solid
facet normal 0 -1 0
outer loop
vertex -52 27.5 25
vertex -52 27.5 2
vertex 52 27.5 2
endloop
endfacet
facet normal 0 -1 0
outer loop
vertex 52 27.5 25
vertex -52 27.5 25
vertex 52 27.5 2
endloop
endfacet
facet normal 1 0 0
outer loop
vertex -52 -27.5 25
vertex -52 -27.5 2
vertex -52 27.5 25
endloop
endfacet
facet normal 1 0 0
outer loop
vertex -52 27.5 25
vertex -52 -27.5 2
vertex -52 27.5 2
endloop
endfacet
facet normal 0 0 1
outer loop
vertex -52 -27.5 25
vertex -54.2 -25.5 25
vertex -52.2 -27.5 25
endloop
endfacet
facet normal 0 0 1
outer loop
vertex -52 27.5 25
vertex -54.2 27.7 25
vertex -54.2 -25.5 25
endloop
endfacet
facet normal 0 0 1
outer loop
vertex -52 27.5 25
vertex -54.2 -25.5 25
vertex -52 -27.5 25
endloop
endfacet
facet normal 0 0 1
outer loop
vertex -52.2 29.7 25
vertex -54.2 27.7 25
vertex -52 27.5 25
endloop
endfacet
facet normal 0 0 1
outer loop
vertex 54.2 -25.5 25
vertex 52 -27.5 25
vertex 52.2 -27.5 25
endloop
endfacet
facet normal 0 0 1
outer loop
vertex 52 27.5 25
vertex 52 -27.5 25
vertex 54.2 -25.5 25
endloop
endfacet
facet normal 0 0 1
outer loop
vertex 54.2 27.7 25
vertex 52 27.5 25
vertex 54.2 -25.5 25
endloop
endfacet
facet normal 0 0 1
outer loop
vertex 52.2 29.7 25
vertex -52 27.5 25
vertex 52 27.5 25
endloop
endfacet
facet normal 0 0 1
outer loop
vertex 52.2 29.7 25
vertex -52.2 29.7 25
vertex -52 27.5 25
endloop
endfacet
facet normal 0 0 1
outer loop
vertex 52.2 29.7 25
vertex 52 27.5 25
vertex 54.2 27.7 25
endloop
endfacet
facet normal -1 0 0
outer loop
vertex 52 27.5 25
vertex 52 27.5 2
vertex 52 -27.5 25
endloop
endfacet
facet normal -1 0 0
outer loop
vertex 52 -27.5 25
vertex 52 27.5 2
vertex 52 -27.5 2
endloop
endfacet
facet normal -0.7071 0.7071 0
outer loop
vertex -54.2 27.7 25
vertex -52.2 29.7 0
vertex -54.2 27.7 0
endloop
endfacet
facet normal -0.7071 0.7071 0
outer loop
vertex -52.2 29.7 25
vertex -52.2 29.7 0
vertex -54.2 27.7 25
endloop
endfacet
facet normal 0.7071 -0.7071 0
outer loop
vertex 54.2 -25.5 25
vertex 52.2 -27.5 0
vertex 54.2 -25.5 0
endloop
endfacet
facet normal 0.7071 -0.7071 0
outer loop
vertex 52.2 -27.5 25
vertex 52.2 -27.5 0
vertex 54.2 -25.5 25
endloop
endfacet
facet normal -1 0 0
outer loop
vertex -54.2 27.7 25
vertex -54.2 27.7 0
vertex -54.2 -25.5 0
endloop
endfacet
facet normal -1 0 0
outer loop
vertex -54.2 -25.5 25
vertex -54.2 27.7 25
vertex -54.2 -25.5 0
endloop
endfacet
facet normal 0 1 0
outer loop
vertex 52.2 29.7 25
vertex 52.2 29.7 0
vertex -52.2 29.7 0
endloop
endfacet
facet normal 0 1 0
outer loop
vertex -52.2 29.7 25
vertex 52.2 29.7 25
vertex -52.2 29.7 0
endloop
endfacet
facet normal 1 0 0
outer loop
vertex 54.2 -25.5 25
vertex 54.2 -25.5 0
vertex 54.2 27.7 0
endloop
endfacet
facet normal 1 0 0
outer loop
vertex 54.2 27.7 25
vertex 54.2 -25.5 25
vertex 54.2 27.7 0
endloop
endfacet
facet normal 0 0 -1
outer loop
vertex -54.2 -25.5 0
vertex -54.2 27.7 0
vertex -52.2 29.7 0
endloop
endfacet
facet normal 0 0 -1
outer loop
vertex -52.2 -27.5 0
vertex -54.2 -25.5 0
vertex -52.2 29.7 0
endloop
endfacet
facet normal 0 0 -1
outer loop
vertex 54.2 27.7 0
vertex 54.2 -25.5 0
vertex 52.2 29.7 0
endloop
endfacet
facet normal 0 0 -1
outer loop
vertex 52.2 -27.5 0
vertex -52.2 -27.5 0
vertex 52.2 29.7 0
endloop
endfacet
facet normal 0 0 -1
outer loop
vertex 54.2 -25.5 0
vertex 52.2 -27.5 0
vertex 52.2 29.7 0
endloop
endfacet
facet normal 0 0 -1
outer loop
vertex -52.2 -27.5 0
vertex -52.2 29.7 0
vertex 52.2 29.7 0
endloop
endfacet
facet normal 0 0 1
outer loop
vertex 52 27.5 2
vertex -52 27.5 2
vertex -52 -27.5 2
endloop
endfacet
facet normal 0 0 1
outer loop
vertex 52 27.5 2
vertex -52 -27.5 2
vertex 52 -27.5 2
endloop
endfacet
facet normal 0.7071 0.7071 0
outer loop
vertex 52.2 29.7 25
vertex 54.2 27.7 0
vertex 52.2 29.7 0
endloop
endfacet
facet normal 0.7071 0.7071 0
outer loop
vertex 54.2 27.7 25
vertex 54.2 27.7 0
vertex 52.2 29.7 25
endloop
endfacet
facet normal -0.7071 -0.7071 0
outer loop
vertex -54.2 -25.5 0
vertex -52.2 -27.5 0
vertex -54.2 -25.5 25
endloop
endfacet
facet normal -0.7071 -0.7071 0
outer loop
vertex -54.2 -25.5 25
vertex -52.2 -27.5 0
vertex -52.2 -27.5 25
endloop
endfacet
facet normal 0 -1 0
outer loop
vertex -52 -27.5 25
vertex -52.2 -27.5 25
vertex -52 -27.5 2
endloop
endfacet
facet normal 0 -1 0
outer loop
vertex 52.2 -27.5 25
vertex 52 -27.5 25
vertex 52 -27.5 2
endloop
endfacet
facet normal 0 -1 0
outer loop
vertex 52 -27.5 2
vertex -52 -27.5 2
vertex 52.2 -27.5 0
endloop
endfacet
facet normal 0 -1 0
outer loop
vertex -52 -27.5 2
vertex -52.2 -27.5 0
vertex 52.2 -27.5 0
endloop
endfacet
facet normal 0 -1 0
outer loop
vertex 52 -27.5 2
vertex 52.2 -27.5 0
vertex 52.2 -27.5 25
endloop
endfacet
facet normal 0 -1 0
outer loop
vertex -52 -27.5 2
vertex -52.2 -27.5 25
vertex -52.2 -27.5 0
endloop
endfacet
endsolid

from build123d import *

# Parameters (mm, degrees)
F0_W     = 104
F0_H     = 55
F1_DEPTH = 2
F2_DEPTH = 25
F3_SIZE  = 2


with BuildPart() as f1:
    # F0 (on Top) → F1 (new body)
    with BuildSketch(Plane.XY):
        Rectangle(F0_W, F0_H)
    extrude(amount=F1_DEPTH)

    # F0 (on Top) → F2 (join)
    with BuildSketch(Plane.XY):
        Polygon((52, 27.5), (52, -27.5), (54.2, -27.5), (54.2, 29.7), (-54.2, 29.7), (-54.2, -27.5), (-52, -27.5), (-52, 27.5), align=None)
    extrude(amount=F2_DEPTH)

    # F3
    f3_edges = [f1.edges().sort_by_distance(p)[0] for p in [
        (54.2, 29.7, 12.5),
        (-54.2, 29.7, 12.5),
        (-54.2, -27.5, 12.5),
        (54.2, -27.5, 12.5),
    ]]
    chamfer(f3_edges, length=F3_SIZE)


solid = f1.part
